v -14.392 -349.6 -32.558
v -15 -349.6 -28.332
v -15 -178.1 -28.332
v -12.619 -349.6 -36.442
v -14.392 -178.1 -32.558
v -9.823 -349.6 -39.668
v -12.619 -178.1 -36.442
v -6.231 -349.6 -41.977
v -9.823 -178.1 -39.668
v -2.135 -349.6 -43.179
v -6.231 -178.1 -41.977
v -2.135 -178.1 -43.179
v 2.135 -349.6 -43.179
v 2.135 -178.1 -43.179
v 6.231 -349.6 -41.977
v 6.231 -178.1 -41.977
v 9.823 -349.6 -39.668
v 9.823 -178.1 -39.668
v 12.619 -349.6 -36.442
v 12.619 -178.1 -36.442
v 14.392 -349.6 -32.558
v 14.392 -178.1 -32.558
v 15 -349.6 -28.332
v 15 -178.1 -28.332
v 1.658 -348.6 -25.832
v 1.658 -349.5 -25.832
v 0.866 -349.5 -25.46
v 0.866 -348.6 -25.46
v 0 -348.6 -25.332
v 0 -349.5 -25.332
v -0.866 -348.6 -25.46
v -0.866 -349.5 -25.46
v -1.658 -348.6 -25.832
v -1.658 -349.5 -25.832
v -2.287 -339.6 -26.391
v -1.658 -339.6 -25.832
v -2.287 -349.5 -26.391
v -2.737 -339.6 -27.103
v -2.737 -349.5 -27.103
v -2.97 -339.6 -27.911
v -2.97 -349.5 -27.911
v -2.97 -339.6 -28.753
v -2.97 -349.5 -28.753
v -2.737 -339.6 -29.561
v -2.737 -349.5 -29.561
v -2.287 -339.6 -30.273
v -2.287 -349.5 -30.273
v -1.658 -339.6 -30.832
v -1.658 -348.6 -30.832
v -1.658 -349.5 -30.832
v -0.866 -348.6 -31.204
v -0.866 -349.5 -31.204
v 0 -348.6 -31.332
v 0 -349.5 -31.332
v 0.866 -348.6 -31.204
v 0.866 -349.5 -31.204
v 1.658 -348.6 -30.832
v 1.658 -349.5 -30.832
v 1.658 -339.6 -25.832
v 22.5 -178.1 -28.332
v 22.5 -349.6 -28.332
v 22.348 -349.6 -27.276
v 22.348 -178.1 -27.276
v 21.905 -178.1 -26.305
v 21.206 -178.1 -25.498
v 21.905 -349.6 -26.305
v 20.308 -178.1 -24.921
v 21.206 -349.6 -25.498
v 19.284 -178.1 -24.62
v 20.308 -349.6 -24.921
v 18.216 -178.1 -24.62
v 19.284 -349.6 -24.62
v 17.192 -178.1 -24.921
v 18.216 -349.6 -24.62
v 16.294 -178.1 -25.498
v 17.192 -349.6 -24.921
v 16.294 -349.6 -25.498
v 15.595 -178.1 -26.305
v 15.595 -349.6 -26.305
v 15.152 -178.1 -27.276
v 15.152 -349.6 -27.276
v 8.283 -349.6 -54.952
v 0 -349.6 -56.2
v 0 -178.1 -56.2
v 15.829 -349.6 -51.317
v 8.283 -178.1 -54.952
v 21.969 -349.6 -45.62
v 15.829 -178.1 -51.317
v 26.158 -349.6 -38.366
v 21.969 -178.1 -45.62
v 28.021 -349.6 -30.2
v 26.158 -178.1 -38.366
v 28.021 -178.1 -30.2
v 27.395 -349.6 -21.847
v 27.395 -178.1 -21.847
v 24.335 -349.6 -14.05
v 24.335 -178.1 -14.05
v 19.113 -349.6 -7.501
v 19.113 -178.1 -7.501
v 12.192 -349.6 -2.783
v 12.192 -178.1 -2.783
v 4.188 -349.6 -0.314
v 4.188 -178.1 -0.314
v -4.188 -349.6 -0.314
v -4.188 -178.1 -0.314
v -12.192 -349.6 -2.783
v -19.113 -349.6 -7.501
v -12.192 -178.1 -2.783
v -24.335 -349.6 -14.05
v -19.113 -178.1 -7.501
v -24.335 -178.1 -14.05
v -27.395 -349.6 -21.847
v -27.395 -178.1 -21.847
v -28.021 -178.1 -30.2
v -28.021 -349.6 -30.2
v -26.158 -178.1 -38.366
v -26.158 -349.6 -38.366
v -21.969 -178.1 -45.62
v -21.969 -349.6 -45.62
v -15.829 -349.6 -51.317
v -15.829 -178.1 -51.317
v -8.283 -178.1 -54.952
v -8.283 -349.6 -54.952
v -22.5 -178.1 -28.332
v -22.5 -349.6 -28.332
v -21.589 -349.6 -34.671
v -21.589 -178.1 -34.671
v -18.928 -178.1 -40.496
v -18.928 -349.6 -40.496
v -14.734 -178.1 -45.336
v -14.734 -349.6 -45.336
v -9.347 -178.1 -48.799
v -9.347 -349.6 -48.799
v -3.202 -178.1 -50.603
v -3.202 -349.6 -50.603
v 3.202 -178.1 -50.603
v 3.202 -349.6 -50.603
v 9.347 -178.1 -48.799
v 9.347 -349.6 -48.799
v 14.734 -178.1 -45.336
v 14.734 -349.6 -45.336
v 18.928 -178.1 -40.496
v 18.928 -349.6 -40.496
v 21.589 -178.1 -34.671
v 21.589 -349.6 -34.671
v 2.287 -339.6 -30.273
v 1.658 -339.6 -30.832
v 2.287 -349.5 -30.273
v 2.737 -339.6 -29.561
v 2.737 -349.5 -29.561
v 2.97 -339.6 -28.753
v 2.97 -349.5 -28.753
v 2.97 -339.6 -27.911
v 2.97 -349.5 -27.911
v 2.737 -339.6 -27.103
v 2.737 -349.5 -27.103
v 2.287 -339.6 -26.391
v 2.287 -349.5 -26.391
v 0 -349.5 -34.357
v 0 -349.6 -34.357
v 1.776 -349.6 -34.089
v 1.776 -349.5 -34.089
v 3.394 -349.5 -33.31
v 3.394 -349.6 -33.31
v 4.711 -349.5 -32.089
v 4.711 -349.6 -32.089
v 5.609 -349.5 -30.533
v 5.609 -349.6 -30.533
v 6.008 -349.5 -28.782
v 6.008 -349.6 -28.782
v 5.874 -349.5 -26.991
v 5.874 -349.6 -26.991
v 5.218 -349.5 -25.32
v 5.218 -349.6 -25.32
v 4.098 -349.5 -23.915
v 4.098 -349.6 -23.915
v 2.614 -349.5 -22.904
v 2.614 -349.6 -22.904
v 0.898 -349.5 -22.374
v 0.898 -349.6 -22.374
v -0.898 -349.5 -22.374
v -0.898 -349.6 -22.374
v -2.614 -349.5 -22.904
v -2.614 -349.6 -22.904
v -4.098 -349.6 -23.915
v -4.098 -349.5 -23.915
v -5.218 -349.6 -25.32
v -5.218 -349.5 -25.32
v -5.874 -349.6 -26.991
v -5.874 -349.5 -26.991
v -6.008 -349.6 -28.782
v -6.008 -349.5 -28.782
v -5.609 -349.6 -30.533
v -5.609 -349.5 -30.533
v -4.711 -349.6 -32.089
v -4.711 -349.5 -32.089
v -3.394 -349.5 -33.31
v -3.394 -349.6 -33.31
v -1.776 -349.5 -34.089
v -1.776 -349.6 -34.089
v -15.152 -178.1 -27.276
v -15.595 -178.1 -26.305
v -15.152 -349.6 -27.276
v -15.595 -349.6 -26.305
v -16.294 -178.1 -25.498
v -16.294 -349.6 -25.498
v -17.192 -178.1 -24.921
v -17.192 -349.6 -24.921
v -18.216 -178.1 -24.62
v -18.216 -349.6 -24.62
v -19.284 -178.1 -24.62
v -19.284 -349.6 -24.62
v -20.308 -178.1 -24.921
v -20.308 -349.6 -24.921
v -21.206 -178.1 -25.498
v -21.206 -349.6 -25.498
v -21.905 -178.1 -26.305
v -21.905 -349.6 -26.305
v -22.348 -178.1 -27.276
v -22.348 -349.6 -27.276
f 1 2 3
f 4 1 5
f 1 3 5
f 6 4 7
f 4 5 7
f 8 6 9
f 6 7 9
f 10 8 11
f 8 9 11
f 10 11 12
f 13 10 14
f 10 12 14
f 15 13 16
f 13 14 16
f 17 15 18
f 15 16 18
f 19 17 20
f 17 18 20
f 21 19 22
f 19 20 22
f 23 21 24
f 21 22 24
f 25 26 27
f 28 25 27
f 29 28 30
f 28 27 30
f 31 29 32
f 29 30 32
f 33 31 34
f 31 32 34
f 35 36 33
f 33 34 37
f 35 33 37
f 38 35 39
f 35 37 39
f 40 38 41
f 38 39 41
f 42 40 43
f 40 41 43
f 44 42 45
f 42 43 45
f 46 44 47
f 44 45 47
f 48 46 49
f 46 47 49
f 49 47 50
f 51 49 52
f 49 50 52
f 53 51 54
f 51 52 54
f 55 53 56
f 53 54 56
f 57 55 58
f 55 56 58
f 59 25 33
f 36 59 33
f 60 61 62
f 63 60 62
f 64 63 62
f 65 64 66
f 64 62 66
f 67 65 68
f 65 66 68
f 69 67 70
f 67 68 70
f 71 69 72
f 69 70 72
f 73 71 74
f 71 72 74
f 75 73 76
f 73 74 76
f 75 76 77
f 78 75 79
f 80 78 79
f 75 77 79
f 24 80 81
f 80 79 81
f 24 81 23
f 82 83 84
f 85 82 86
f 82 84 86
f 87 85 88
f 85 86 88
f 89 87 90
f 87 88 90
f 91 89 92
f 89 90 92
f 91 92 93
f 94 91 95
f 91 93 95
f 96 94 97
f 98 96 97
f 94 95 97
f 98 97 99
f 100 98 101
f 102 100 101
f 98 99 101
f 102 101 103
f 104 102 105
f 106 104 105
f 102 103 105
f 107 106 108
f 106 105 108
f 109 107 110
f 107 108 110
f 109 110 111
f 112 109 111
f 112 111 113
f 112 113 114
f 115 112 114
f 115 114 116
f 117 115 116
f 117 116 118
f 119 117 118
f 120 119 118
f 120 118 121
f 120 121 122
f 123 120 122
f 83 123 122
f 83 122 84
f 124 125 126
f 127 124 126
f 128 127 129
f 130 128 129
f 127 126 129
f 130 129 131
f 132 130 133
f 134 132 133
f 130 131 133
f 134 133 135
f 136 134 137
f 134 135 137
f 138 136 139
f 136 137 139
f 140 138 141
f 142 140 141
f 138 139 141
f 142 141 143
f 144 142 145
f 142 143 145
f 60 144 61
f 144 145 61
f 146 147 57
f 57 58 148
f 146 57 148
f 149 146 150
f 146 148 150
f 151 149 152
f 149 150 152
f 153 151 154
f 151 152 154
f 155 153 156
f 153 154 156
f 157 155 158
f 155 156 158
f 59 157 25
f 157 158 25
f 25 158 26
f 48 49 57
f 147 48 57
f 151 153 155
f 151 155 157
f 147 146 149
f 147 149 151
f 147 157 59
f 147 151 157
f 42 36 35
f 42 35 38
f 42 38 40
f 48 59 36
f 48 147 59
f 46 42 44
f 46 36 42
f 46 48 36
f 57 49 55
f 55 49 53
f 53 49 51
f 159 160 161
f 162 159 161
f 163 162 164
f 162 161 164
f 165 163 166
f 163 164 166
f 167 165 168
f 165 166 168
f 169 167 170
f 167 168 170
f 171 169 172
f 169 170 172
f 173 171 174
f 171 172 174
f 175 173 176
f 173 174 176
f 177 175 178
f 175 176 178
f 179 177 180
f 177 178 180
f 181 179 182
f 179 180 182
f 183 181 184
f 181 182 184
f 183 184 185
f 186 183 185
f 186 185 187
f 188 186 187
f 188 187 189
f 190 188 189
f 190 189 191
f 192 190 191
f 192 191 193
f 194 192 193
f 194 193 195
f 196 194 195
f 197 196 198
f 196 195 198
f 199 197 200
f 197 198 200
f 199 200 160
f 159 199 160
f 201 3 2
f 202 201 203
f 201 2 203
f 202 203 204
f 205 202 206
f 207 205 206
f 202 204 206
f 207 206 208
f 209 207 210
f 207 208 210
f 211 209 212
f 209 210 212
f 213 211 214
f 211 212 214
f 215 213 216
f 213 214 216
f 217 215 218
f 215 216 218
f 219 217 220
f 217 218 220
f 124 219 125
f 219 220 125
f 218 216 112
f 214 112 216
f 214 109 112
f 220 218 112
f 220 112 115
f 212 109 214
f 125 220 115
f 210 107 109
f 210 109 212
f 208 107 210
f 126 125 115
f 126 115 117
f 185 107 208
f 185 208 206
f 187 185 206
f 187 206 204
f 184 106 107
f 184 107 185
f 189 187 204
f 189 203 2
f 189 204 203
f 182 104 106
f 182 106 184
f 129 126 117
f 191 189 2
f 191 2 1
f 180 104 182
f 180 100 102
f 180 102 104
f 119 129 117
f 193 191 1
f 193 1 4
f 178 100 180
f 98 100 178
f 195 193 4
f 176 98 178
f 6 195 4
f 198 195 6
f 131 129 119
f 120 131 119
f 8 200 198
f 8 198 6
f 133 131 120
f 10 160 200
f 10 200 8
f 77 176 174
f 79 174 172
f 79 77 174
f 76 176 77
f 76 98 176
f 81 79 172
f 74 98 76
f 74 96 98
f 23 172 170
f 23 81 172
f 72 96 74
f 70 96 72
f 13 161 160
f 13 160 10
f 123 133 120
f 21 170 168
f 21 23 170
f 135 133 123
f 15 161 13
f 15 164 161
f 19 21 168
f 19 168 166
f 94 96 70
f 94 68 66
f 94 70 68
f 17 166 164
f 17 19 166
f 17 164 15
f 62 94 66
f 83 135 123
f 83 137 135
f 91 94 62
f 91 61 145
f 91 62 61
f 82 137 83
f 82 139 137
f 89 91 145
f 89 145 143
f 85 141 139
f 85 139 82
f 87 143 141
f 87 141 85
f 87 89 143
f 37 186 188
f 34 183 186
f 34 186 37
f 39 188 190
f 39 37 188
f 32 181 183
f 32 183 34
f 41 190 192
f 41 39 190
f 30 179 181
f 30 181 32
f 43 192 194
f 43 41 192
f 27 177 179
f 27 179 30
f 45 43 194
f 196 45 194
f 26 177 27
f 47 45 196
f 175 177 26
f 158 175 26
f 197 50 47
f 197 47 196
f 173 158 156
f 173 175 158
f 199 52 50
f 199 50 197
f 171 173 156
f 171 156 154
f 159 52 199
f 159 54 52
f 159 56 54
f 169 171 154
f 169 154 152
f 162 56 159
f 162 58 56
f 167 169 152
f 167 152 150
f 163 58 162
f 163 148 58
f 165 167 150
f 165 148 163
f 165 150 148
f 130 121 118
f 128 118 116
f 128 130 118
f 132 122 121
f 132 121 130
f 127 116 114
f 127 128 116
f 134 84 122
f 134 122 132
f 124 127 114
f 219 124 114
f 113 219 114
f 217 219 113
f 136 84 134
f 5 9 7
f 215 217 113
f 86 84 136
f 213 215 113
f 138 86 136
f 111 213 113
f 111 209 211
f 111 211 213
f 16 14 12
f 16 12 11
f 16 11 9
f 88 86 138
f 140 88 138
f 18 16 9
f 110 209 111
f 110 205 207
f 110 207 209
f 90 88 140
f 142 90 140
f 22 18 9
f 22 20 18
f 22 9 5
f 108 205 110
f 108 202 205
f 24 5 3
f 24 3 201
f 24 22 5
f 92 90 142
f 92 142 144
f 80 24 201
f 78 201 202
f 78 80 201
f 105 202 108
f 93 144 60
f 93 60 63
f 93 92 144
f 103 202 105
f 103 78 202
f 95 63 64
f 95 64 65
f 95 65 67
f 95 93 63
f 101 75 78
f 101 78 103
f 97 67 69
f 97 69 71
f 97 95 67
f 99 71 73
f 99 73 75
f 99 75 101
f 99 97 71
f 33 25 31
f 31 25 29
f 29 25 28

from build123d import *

# Parameters (mm, degrees)
SKETCH1_R           = 28.1
BOSS_EXTRUDE2_DEPTH = 61.3
SKETCH3_R           = 18.6
CUT_EXTRUDE2_DEPTH  = 58.8
SKETCH4_W           = 56.2
SKETCH4_H           = 56.2
BOSS_EXTRUDE3_DEPTH = 56.2
SKETCH5_R           = 16.1
CUT_EXTRUDE4_DEPTH  = 5
SKETCH6_W           = 49.797391422
SKETCH6_H           = 49.779255452
CUT_EXTRUDE5_DEPTH  = 53.7
SKETCH7_R           = 28.1
BOSS_EXTRUDE4_DEPTH = 321.5
CUT_EXTRUDE6_DEPTH  = 10
SKETCH9_R           = 3
CUT_EXTRUDE7_DEPTH  = 1
SKETCH10_R          = 6.025
CUT_EXTRUDE8_DEPTH  = 0.1
SKETCH18_R          = 3.75
CUT_EXTRUDE9_DEPTH  = 100
SKETCH19_R          = 3.75
CUT_EXTRUDE11_DEPTH = 325
SKETCH20_W          = 56.2
SKETCH20_H          = 56.2
CUT_EXTRUDE13_DEPTH = 200
SKETCH21_R          = 28.1
CUT_EXTRUDE14_DEPTH = 150


with BuildPart() as part:
    # Sketch1 → Boss-Extrude2 (new body)
    with BuildSketch(Plane.XY):
        Circle(SKETCH1_R)
    extrude(amount=BOSS_EXTRUDE2_DEPTH)

    # Sketch3 → Cut-Extrude2 (cut)
    with BuildSketch(Plane.XY.offset(61.3)):
        with Locations((0, -7)):
            Circle(SKETCH3_R)
    extrude(amount=-CUT_EXTRUDE2_DEPTH, mode=Mode.SUBTRACT)

    # Sketch4 → Boss-Extrude3 (add)
    with BuildSketch(Plane(origin=(0, 0, 0), x_dir=(-1, 0, 0), z_dir=(0, 0, -1))):
        Rectangle(SKETCH4_W, SKETCH4_H)
    extrude(amount=BOSS_EXTRUDE3_DEPTH)

    # Sketch5 → Cut-Extrude4 (cut)
    with BuildSketch(Plane.XY.offset(2.5)):
        with Locations((0, -7)):
            Circle(SKETCH5_R)
    extrude(amount=-CUT_EXTRUDE4_DEPTH, mode=Mode.SUBTRACT)

    # Sketch6 → Cut-Extrude5 (cut)
    with BuildSketch(Plane(origin=(0, 0, -56.2), x_dir=(-1, 0, 0), z_dir=(0, 0, -1))):
        Rectangle(SKETCH6_W, SKETCH6_H)
    extrude(amount=-CUT_EXTRUDE5_DEPTH, mode=Mode.SUBTRACT)

    # Sketch7 → Boss-Extrude4 (add)
    with BuildSketch(Plane(origin=(0, -28.1, 0), x_dir=(-1, 0, 0), z_dir=(0, -1, 0))):
        with Locations(Location((0, 28.1, 0), (0, 0, 90))):
            Circle(SKETCH7_R)
    extrude(amount=BOSS_EXTRUDE4_DEPTH)

    # Sketch8 → Cut-Extrude6 (cut)
    with BuildSketch(Plane(origin=(0, -349.6, 0), x_dir=(-1, 0, 0), z_dir=(0, -1, 0))):
        with BuildLine():
            Line((-1.658312395, 25.832078896), (1.658312395, 25.832078896))
            ThreePointArc((1.658312395, 25.832078896), (3, 28.332078896), (1.658312395, 30.832078896))
            Line((1.658312395, 30.832078896), (-1.658312395, 30.832078896))
            ThreePointArc((-1.658312395, 30.832078896), (-3, 28.332078896), (-1.658312395, 25.832078896))
        make_face()
    extrude(amount=-CUT_EXTRUDE6_DEPTH, mode=Mode.SUBTRACT)

    # Sketch9 → Cut-Extrude7 (cut)
    with BuildSketch(Plane(origin=(0, -349.6, 0), x_dir=(-1, 0, 0), z_dir=(0, -1, 0))):
        with Locations(Location((0, 28.332078896, 0), (0, 0, 90))):
            Circle(SKETCH9_R)
    extrude(amount=-CUT_EXTRUDE7_DEPTH, mode=Mode.SUBTRACT)

    # Sketch10 → Cut-Extrude8 (cut)
    with BuildSketch(Plane(origin=(0, -349.6, 0), x_dir=(-1, 0, 0), z_dir=(0, -1, 0))):
        with Locations(Location((0, 28.332078896, 0), (0, 0, 90))):
            Circle(SKETCH10_R)
    extrude(amount=-CUT_EXTRUDE8_DEPTH, mode=Mode.SUBTRACT)

    # Cut-Sweep4: sweep along a path in Sketch15
    with BuildLine(Plane(origin=(0, -349.6, 0), x_dir=(-1, 0, 0), z_dir=(0, -1, 0))) as cut_sweep4_path:
        ThreePointArc((15, 28.332078896), (0, 43.332078896), (-15, 28.332078896))
    # 3DSketch2 → Cut-Sweep4 (sweep, cut)
    with BuildSketch(Plane(origin=(-15, -349.6, -28.332078896), x_dir=(-0.022748965612757834, 0.999741208795331, 0), z_dir=(0, 0, 1))):
        Polygon((0, 0), (0.170617242, 7.498059066), (329.685319661, 0), (329.514702419, -7.498059066), align=None)
    sweep(path=cut_sweep4_path.line, mode=Mode.SUBTRACT)

    # Sketch18 → Cut-Extrude9 (cut)
    with BuildSketch(Plane.XY.offset(61.3)):
        with Locations((0, 18.75)):
            Circle(SKETCH18_R)
    extrude(amount=-CUT_EXTRUDE9_DEPTH, mode=Mode.SUBTRACT)

    # Sketch19 → Cut-Extrude11 (cut)
    with BuildSketch(Plane(origin=(0, -349.6, 0), x_dir=(-1, 0, 0), z_dir=(0, -1, 0))):
        with Locations((-18.75, 28.332078896)):
            Circle(SKETCH19_R)
        with Locations((18.75, 28.332078896)):
            Circle(SKETCH19_R)
    extrude(amount=-CUT_EXTRUDE11_DEPTH, mode=Mode.SUBTRACT)

    # Sketch20 → Cut-Extrude13 (cut)
    with BuildSketch(Plane(origin=(0, 0, -56.2), x_dir=(-1, 0, 0), z_dir=(0, 0, -1))):
        Rectangle(SKETCH20_W, SKETCH20_H)
    extrude(amount=-CUT_EXTRUDE13_DEPTH, mode=Mode.SUBTRACT)

    # Sketch21 → Cut-Extrude14 (cut)
    with BuildSketch(Plane(origin=(0, -28.1, 0), x_dir=(1, 0, 0), z_dir=(0, 1, 0))):
        with Locations(Location((0, 28.1, 0), (0, 0, 270))):
            Circle(SKETCH21_R)
    extrude(amount=-CUT_EXTRUDE14_DEPTH, mode=Mode.SUBTRACT)


solid = part.part
